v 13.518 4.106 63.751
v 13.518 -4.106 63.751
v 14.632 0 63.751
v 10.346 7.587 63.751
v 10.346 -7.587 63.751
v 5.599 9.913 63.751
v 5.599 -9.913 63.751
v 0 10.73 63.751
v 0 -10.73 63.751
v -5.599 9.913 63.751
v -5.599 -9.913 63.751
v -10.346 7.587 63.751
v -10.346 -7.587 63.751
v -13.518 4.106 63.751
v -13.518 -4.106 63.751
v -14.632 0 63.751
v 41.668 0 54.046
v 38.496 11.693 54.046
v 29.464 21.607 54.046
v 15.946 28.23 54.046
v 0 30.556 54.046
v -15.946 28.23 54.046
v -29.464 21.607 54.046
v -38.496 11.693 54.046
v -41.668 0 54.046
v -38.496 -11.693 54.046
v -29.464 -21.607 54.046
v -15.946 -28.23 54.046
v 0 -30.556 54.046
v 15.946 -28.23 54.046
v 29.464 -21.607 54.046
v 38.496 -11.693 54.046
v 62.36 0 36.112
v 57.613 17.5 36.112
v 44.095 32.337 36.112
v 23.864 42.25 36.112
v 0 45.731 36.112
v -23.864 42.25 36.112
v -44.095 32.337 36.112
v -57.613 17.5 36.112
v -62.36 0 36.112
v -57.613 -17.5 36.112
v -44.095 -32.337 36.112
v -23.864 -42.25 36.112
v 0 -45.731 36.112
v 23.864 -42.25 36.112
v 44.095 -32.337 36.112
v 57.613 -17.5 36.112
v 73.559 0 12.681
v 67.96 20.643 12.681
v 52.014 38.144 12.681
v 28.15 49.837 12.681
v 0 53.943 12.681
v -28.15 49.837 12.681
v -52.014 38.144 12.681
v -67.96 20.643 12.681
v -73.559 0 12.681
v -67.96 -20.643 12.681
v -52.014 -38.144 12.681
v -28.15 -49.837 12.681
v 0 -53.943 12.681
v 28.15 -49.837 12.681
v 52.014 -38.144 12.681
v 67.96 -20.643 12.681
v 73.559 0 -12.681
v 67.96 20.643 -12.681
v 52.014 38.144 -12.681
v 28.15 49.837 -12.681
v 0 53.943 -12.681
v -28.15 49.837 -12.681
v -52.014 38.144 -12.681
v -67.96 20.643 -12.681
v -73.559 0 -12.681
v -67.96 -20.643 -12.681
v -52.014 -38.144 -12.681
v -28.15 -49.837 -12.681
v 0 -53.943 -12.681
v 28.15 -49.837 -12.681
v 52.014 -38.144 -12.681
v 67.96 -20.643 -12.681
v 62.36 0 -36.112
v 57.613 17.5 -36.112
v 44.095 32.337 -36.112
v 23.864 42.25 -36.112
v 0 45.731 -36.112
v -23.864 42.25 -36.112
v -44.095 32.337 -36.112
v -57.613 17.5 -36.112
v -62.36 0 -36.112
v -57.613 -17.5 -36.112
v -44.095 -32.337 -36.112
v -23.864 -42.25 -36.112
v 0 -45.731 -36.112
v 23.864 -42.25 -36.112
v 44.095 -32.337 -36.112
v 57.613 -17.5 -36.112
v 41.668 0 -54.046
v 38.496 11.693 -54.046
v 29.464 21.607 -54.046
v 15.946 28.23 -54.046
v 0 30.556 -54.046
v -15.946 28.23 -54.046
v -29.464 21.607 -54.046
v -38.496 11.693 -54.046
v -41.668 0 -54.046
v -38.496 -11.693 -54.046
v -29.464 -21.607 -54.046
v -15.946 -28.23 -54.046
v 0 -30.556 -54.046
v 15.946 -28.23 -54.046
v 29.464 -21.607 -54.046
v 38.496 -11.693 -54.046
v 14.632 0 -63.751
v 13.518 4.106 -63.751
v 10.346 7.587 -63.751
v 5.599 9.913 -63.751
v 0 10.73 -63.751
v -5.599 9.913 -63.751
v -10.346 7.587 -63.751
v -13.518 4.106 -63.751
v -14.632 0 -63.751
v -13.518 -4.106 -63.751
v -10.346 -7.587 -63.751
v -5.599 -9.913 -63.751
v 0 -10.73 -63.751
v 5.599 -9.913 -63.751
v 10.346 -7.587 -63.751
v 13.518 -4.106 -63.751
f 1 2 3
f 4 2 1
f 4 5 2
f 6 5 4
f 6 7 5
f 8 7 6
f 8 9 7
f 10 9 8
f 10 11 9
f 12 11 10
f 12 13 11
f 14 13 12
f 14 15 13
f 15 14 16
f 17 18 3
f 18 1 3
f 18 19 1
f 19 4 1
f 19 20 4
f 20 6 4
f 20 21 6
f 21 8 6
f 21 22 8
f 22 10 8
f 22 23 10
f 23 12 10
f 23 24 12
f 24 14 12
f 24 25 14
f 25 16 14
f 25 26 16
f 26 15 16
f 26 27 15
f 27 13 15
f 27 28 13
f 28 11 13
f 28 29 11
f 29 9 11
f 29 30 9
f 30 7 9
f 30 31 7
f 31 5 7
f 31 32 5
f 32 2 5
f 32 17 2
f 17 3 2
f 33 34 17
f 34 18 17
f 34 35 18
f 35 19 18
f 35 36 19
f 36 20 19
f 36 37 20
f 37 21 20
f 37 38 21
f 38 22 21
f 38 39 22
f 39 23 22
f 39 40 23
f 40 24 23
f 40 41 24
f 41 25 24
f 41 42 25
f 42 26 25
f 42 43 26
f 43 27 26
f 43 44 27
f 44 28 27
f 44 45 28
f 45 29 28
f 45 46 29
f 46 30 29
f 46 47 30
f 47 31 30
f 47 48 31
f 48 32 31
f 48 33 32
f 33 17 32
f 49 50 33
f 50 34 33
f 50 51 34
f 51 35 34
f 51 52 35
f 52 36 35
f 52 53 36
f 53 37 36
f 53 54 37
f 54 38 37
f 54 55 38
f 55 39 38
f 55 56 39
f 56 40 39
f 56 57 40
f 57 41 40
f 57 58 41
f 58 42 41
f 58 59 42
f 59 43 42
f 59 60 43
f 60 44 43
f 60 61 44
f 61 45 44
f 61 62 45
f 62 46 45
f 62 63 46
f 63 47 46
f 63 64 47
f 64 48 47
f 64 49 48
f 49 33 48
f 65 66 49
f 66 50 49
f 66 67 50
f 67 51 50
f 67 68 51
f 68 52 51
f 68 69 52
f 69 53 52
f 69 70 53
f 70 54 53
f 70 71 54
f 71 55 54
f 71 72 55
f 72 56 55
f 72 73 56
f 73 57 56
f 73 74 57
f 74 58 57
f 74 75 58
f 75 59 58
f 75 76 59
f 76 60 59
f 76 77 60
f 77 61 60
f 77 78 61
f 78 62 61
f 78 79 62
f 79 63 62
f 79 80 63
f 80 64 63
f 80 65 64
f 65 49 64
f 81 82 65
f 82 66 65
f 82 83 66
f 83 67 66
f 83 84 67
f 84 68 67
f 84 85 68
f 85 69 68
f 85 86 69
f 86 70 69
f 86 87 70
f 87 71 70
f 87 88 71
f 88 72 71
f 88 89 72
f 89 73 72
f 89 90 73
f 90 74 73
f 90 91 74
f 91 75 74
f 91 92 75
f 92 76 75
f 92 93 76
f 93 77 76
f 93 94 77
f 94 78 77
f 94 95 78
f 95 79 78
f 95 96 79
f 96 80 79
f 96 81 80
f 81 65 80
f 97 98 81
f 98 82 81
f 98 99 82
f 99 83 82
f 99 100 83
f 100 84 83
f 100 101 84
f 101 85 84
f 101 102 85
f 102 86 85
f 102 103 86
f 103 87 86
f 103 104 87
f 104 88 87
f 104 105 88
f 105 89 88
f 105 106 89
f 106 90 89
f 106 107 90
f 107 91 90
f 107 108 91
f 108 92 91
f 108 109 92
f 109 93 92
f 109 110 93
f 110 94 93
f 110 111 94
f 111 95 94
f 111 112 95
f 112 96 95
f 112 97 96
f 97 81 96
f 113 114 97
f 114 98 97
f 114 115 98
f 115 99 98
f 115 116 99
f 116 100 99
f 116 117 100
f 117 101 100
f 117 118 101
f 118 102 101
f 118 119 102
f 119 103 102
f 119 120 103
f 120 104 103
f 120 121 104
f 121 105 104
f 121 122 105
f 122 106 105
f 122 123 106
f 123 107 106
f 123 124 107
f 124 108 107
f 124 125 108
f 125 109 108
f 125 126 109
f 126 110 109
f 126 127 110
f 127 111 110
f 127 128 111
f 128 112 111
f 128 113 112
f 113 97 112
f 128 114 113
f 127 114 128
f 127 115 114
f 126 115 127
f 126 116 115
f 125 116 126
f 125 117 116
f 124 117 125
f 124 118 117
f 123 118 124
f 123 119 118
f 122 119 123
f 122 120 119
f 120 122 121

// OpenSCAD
// Generated by SolidPython 1.0.1 on 2020-07-29 00:46:52


scale(v = [15, 11, 13]) {
	sphere(r = 5);
}
/***********************************************
*********      SolidPython code:      **********
************************************************
 
# import packages: SolidPython
from solid import *
from solid.utils import *
from itertools import chain, combinations, permutations


class Resize:

    def __init__(self, scad_file):
        self.scad_file = scad_file
        #self.scad_file = import_scad(scad_file)
        # cone/cylinder param:
        self.r1 = 0
        self.r2 = 0
        self.h = 0
        # rectangular prism param:
        self.w = 0
        self.l = 0
        # ellipse param:
        self.r = 0

    # import OpenScad code (file name corresponds to shape)


    # classify shape + parameters
    def assign(self, param1, param2, param3):
        if self.scad_file == 'cone.scad':
            self.r1 = param1
            self.r2 = param2
            self.h = param3
        elif self.scad_file == 'cylinder.scad':
            self.r1 = param1
            self.r2 = param2
            self.h = param3
        elif self.scad_file == 'rectangularPrism.scad':
            self.h = param1
            self.l = param2
            self.w = param3
        else:
            self.r = param1
            self.h = param2

    # resize parameters
    def iterate(self):
        x = range(3, 20, 2)
        i = 1
        if self.scad_file == 'cone.scad':
            tempList = list(permutations(x, 2))
            for temp in tempList:
                param1 = temp[0]
                param2 = temp[1]
                filepath = 'produced_scad_files/' + 'cone' + str(param1) + '_' + str(param2) + '_' + '.scad'
                scad_render_to_file(cylinder(h=param1, r1=param2, r2=0), filepath)

        elif self.scad_file == 'cylinder.scad':
            tempList = list(permutations(x, 3))
            for temp in tempList:
                param1 = temp[0]
                param2 = temp[1]
                filepath = 'produced_scad_files/' + 'cylinder' + str(param1) + '_' + str(param2) + '_' + '.scad'
                scad_render_to_file(cylinder(h=param1, r1=param2, r2=param2), filepath)

        elif self.scad_file == 'rectangularPrism.scad':
            tempList = list(permutations(x, 3))
            for temp in tempList:
                param1 = temp[0]
                param2 = temp[1]
                param3 = temp[2]
                filepath = 'produced_scad_files/' + 'rectangularPrism' + str(param1) + '_' + str(param2) + '_' + str(
                    param3) + '.scad'
                scad_render_to_file(cube(size=(param1, param2, param3)), filepath)

        elif self.scad_file == 'ellipse.scad':
            tempList = list(permutations(x, 4))
            for temp in tempList:
                param1 = temp[0]
                param2 = temp[1]
                param3 = temp[2]
                param4 = temp[3]
                filepath = 'produced_scad_files/' + 'ellipse' + str(param1) + '_' + str(param2) + '_' + str(param3) + '_' + str(param4) + '.scad'
                scad_render_to_file(scale([param1, param2, param3])(sphere(r=param4)), filepath)

    def render_to_scadfile(self):
        scad_render_to_file(scad, 'example.scad') 
 
************************************************/
